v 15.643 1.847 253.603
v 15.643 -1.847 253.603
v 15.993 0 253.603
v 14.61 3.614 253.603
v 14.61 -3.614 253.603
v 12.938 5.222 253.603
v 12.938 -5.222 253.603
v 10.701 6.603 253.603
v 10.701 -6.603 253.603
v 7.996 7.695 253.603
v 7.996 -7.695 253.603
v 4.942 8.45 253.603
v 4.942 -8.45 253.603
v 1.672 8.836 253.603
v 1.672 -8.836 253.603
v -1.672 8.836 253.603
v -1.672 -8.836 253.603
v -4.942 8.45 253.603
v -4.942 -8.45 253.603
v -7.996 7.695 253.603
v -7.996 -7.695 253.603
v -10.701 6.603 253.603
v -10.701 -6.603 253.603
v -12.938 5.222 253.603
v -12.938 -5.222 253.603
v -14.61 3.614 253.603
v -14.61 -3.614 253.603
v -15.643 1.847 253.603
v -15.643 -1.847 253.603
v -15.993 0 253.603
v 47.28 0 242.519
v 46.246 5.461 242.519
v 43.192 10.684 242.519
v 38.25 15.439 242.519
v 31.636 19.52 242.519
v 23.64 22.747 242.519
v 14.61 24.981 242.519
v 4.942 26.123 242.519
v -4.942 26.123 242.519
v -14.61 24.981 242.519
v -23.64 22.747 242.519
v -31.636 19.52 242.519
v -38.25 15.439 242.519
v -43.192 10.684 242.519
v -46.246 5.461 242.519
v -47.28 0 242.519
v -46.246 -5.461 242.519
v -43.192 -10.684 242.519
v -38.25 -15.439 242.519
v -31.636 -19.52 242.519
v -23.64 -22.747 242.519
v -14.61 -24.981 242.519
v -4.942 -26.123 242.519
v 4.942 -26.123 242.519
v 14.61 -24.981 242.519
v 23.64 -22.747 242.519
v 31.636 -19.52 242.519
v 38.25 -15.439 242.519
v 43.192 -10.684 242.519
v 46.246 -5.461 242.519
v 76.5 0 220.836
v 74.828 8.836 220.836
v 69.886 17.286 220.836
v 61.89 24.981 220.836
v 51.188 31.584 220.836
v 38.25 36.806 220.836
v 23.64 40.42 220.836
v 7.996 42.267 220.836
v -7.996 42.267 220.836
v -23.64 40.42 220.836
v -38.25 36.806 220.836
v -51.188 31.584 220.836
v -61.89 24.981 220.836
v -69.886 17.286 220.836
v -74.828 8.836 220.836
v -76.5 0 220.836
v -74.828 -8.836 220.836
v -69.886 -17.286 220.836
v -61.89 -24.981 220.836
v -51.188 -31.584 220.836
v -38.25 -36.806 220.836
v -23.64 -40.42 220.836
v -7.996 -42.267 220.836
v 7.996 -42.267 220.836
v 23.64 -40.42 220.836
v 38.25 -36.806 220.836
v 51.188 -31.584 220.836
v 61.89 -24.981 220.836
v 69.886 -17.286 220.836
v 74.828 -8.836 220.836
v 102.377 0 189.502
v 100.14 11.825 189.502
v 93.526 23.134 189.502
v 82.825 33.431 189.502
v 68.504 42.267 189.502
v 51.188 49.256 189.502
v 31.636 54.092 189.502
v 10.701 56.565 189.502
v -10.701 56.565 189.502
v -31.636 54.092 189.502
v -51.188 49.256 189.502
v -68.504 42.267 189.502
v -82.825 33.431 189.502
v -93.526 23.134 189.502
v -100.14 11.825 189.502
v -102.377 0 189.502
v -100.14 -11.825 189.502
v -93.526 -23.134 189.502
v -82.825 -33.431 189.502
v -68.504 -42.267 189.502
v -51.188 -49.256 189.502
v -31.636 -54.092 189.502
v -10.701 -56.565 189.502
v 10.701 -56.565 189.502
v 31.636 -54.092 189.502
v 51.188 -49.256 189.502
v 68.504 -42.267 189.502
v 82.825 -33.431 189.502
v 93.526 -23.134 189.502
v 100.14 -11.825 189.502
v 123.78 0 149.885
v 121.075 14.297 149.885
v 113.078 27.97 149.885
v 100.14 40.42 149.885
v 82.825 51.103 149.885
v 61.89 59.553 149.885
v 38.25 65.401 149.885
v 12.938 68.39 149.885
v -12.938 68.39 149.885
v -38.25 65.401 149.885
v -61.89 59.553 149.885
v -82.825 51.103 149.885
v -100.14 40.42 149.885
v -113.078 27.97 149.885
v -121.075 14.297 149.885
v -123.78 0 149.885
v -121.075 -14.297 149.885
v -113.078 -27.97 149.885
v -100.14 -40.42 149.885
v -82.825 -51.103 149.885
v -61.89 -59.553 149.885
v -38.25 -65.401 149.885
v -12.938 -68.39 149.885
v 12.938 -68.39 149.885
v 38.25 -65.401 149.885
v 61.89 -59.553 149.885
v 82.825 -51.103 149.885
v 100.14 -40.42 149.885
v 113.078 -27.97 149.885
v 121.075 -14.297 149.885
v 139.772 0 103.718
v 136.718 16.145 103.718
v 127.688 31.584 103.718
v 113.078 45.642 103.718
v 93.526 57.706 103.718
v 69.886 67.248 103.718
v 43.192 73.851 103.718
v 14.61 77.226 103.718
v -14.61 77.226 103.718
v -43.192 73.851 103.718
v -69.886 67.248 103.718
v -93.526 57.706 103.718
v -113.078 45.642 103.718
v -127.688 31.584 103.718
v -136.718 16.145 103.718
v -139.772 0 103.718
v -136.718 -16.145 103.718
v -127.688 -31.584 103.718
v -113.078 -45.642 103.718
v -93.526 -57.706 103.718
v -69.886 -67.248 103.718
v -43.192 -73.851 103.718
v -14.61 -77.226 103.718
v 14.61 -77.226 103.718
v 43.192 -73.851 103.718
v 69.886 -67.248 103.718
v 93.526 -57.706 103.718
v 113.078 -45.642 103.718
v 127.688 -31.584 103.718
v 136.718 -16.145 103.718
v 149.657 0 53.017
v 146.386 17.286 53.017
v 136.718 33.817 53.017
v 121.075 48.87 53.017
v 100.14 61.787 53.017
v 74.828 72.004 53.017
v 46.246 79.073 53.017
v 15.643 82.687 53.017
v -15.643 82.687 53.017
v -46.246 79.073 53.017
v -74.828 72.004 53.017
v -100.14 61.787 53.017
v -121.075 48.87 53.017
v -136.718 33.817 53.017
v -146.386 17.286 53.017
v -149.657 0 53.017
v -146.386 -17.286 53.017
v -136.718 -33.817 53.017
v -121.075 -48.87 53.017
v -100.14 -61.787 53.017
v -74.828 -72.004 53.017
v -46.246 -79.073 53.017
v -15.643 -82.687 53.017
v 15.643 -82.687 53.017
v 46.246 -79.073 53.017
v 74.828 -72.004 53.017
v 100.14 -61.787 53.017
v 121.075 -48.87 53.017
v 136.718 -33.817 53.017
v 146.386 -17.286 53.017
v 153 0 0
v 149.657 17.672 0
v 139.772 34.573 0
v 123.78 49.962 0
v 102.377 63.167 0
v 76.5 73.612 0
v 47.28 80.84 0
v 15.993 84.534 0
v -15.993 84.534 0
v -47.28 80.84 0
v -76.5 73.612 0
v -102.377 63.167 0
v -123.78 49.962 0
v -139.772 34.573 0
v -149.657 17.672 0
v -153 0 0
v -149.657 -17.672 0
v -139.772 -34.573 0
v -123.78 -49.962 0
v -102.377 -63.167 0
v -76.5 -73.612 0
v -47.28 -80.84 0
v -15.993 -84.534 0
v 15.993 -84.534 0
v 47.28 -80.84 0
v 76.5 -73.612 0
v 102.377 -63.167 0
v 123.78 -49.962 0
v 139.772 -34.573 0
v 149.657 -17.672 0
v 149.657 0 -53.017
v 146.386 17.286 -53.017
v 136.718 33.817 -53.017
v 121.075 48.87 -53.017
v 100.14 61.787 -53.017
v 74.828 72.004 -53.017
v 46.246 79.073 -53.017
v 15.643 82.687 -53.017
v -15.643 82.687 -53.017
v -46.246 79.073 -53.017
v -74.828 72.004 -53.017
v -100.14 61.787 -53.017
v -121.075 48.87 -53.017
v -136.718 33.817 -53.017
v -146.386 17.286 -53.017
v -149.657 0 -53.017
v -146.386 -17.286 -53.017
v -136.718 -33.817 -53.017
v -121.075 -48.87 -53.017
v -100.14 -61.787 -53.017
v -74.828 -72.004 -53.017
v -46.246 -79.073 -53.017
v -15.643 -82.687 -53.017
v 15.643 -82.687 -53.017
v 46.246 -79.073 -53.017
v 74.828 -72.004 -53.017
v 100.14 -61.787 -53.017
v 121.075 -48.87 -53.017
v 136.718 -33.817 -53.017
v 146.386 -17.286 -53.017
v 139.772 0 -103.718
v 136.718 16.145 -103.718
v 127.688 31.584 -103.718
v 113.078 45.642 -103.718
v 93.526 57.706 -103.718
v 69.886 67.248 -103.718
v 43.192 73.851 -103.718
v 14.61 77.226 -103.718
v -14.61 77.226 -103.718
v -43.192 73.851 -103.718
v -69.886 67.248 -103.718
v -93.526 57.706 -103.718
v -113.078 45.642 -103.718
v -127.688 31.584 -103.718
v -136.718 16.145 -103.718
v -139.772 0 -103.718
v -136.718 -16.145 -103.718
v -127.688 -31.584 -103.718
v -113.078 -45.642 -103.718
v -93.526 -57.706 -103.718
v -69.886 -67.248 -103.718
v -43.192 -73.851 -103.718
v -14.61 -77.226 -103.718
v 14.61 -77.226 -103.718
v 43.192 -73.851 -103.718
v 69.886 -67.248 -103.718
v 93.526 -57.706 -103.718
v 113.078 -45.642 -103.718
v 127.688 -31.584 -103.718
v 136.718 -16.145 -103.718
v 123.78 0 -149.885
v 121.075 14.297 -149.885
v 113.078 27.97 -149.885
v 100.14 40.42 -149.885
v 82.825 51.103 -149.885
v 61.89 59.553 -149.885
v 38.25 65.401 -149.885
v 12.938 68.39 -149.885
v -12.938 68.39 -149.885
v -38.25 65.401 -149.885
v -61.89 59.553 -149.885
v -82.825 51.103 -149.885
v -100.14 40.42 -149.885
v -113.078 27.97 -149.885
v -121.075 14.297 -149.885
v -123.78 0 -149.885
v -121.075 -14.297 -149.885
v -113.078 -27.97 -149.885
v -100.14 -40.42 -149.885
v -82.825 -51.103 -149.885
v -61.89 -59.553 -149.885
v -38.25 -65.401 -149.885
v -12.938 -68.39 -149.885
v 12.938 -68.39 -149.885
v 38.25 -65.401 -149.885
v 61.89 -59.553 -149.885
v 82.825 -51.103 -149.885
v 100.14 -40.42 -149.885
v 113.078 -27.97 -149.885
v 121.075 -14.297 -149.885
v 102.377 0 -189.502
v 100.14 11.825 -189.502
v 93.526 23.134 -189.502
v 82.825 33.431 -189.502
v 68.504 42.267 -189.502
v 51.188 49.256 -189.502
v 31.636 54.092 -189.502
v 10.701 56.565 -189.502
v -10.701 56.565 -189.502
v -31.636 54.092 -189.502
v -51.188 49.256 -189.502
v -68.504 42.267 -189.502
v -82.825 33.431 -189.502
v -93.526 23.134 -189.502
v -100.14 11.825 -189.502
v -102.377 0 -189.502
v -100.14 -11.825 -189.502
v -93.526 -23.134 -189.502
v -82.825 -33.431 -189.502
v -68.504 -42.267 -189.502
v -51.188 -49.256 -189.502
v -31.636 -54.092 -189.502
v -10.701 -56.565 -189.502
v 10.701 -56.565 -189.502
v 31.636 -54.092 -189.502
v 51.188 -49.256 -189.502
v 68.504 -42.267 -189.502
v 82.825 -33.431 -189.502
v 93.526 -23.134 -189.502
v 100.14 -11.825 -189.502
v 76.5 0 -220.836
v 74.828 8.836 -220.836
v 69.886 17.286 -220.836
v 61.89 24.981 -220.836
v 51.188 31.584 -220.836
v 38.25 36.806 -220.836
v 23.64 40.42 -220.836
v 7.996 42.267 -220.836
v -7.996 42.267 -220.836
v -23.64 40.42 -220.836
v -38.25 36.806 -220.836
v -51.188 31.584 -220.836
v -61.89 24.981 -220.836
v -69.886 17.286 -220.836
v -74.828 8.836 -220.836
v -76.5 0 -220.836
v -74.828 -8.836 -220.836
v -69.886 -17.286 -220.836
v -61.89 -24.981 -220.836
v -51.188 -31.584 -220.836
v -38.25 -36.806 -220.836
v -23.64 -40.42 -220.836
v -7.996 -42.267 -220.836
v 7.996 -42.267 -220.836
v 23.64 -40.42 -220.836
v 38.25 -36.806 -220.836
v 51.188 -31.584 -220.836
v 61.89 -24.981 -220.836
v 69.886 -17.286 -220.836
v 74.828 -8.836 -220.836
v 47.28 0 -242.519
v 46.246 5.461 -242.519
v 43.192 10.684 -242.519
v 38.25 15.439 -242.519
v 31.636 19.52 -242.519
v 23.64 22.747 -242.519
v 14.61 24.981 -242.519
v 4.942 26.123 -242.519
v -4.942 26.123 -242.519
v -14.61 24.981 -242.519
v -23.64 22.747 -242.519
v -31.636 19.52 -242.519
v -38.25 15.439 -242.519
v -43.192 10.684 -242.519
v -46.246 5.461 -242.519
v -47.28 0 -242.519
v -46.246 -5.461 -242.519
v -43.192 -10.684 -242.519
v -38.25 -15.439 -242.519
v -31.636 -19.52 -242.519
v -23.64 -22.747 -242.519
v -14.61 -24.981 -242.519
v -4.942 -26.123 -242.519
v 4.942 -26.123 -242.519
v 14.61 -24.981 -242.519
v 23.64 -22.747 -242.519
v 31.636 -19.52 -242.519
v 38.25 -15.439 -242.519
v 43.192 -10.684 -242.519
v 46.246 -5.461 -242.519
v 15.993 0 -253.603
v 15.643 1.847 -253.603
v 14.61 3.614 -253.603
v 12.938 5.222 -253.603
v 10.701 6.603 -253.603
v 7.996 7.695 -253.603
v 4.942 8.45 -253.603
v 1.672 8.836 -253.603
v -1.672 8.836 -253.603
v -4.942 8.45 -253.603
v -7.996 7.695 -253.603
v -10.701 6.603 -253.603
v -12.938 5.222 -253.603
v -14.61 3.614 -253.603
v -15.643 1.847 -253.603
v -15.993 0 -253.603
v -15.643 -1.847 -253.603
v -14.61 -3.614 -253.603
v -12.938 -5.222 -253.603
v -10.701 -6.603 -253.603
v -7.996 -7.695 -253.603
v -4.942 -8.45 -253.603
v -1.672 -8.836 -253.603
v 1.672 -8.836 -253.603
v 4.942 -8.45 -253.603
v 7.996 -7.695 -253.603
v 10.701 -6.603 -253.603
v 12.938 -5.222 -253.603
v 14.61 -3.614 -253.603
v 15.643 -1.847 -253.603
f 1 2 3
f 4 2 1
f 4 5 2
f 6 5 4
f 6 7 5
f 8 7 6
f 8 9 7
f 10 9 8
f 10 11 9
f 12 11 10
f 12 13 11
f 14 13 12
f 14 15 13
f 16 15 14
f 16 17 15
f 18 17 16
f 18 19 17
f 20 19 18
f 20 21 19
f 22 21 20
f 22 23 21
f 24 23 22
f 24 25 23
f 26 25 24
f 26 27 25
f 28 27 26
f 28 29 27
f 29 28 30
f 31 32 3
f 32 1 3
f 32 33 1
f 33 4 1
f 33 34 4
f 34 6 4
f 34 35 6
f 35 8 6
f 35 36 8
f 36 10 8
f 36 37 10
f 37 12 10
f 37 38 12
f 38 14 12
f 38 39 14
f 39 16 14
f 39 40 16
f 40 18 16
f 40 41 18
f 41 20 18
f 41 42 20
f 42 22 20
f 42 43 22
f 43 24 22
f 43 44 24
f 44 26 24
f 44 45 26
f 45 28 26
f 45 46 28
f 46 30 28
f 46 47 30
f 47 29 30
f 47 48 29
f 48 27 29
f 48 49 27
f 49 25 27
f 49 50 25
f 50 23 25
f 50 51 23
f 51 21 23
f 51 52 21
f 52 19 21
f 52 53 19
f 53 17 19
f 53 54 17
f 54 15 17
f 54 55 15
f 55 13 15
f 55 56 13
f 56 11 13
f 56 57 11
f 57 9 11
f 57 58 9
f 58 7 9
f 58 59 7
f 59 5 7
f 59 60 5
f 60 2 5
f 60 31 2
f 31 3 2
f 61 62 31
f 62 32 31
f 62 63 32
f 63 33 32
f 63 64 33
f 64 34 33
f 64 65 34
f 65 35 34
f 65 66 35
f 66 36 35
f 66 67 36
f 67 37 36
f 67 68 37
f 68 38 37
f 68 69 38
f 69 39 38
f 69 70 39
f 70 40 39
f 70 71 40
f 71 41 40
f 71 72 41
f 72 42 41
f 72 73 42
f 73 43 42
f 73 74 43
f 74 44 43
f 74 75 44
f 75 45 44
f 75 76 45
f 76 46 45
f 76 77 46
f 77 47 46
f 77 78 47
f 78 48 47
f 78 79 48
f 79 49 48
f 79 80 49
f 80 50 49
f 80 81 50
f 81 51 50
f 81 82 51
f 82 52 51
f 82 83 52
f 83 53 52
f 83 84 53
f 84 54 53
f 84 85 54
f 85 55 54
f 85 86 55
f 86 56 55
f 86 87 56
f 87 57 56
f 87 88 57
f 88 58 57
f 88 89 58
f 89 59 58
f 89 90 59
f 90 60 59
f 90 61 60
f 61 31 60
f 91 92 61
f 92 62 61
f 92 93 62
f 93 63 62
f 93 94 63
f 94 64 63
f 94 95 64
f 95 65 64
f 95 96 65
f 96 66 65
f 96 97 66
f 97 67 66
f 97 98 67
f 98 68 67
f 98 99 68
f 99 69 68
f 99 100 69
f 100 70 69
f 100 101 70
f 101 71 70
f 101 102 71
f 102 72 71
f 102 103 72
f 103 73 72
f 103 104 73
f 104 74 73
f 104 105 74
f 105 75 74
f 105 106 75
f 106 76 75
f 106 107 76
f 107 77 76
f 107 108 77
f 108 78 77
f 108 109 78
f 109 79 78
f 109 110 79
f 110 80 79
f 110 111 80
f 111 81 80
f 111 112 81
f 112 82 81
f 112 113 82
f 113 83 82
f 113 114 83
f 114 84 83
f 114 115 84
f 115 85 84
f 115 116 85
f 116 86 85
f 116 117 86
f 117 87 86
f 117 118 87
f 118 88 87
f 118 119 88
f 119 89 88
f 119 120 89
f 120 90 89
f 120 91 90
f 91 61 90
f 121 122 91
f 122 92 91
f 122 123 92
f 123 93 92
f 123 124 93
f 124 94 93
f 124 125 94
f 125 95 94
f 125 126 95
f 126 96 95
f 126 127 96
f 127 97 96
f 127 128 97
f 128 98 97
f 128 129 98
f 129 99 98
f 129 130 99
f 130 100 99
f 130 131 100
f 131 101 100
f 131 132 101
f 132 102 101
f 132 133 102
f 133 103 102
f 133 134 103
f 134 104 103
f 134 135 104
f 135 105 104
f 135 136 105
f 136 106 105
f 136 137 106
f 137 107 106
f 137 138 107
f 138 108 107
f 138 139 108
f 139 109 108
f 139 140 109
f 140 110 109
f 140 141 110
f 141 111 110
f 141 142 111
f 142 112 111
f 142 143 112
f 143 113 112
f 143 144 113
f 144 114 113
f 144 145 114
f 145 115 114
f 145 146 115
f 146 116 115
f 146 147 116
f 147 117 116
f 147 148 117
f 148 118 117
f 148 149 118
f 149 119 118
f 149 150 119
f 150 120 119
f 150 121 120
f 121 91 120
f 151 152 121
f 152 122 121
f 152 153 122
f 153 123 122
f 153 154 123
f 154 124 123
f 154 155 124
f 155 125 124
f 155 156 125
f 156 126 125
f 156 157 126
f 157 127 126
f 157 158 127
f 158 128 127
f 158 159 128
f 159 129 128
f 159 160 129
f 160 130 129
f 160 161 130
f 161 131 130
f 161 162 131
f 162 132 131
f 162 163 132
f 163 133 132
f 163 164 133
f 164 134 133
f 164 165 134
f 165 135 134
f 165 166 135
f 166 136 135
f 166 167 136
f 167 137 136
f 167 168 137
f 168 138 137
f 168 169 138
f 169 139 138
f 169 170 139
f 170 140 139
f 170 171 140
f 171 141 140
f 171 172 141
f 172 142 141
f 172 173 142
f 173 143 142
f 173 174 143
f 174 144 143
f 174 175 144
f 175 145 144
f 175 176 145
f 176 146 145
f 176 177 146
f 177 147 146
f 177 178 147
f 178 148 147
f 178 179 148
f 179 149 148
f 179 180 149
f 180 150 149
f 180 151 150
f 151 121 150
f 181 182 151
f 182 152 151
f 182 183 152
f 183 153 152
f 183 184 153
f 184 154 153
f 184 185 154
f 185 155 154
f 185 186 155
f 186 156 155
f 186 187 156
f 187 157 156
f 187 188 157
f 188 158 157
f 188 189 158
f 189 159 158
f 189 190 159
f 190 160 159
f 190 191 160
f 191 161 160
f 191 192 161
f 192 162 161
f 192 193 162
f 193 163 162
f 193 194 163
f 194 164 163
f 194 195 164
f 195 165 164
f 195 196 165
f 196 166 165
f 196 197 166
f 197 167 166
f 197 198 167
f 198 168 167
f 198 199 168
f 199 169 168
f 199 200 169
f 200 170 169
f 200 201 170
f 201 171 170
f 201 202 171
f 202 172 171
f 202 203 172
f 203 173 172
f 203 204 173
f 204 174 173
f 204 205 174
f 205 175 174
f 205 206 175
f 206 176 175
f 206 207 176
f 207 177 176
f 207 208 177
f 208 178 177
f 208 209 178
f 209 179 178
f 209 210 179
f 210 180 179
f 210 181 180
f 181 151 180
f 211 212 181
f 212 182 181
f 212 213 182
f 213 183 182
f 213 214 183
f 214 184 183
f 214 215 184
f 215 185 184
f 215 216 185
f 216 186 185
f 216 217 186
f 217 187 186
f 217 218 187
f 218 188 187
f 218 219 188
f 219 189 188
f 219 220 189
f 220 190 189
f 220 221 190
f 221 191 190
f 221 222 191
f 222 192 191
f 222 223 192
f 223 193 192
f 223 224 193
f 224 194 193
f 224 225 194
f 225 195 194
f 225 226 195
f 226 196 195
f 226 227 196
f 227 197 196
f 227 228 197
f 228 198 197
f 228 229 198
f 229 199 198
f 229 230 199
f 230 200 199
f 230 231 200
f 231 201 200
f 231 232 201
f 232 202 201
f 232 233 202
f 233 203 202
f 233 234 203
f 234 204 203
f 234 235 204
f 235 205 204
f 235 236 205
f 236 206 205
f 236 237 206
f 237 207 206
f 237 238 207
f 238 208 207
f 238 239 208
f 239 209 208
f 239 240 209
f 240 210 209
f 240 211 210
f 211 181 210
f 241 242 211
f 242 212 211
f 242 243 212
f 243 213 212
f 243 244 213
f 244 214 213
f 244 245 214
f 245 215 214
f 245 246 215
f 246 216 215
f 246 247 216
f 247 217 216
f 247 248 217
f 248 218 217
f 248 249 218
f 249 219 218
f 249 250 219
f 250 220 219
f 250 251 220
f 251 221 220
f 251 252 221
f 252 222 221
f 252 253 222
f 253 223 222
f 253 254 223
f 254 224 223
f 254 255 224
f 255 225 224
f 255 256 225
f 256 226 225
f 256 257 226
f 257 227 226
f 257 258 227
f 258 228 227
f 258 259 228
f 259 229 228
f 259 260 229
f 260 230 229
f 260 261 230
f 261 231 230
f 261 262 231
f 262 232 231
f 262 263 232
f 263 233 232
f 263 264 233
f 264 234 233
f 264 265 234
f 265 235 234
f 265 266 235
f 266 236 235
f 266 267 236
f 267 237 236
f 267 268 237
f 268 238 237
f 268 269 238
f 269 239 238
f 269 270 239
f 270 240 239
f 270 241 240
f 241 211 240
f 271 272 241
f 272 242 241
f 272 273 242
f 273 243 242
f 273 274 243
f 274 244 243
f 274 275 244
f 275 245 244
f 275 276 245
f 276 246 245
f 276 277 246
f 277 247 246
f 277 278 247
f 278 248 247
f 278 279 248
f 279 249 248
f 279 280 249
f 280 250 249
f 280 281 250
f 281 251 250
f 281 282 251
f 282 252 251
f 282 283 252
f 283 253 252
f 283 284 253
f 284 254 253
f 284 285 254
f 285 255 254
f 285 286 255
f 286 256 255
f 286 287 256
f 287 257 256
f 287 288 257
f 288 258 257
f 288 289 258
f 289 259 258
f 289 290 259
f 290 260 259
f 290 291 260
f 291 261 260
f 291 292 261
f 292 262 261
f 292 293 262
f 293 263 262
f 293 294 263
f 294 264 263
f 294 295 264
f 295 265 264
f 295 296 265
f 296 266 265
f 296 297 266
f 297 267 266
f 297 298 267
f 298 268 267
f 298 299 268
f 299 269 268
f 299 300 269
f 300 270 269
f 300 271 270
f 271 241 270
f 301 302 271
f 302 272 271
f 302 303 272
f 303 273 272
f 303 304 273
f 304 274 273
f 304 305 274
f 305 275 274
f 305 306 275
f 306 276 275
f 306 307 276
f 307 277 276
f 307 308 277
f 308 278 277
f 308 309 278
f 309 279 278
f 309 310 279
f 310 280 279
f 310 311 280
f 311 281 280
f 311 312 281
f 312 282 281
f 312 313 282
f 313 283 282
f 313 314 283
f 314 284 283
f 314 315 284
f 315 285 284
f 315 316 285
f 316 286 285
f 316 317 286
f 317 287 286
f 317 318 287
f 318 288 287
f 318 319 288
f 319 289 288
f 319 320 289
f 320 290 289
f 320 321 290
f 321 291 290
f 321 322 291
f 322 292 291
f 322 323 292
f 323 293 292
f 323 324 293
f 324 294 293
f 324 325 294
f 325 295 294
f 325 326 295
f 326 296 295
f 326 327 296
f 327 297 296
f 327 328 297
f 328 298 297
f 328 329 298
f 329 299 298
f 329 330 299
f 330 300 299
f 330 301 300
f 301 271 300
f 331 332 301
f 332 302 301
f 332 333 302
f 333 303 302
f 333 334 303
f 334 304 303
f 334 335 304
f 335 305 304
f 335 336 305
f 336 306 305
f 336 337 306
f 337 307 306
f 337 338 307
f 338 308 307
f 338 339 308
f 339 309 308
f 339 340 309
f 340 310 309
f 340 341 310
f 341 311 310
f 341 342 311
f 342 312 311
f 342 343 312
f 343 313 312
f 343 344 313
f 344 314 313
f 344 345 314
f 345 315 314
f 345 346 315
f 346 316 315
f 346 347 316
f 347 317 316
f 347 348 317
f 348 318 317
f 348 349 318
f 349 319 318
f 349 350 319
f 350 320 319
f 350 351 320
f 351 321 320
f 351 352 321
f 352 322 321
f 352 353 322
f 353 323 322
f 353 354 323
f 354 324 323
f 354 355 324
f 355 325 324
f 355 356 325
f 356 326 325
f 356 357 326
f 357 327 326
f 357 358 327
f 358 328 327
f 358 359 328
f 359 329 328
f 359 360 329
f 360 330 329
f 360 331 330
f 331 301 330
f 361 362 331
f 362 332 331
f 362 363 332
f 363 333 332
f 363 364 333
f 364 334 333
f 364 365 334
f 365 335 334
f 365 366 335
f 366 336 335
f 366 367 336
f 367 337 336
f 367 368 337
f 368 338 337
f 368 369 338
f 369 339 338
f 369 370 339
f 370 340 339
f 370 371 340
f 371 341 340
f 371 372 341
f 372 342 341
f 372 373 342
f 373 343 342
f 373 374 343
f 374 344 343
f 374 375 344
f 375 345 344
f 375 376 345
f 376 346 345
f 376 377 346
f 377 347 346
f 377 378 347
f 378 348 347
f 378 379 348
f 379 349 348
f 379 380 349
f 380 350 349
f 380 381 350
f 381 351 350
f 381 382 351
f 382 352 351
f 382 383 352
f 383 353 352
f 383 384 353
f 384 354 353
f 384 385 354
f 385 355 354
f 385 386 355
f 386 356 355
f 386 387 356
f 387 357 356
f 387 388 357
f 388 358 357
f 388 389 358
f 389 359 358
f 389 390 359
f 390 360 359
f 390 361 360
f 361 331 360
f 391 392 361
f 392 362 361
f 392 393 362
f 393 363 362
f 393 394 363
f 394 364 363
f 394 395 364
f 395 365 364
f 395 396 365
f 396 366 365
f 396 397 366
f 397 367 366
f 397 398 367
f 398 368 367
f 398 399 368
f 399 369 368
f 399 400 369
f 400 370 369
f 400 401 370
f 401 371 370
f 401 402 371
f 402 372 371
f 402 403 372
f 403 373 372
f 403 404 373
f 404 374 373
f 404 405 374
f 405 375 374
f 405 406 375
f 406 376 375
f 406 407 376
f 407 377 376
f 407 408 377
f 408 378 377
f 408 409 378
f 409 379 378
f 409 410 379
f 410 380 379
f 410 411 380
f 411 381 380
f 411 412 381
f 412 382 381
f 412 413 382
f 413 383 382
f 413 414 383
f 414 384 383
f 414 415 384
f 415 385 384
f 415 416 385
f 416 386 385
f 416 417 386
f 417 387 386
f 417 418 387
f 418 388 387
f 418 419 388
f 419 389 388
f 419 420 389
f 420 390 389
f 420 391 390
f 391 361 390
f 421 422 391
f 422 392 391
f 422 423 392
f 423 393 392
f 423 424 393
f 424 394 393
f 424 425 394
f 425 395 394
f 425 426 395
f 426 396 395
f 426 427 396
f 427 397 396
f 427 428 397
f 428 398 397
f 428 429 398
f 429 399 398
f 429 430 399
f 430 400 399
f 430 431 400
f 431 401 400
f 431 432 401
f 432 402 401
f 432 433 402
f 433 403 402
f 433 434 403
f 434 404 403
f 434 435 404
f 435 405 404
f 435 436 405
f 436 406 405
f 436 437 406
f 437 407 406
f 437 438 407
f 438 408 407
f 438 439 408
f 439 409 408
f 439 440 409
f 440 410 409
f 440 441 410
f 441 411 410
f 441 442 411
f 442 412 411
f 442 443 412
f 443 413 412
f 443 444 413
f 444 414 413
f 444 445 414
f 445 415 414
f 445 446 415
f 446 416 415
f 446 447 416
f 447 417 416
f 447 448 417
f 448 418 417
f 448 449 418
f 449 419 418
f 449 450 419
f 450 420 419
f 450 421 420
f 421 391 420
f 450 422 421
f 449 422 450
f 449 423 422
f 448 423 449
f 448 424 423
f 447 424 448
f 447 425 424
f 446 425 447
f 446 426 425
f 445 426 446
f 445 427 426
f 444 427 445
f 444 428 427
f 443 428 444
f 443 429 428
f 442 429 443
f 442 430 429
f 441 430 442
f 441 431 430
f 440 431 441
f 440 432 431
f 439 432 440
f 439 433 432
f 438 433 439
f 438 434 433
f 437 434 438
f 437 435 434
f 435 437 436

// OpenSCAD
// Generated by SolidPython 1.0.1 on 2020-07-29 00:46:48


scale(v = [9, 5, 15]) {
	sphere(r = 17);
}
/***********************************************
*********      SolidPython code:      **********
************************************************
 
# import packages: SolidPython
from solid import *
from solid.utils import *
from itertools import chain, combinations, permutations


class Resize:

    def __init__(self, scad_file):
        self.scad_file = scad_file
        #self.scad_file = import_scad(scad_file)
        # cone/cylinder param:
        self.r1 = 0
        self.r2 = 0
        self.h = 0
        # rectangular prism param:
        self.w = 0
        self.l = 0
        # ellipse param:
        self.r = 0

    # import OpenScad code (file name corresponds to shape)


    # classify shape + parameters
    def assign(self, param1, param2, param3):
        if self.scad_file == 'cone.scad':
            self.r1 = param1
            self.r2 = param2
            self.h = param3
        elif self.scad_file == 'cylinder.scad':
            self.r1 = param1
            self.r2 = param2
            self.h = param3
        elif self.scad_file == 'rectangularPrism.scad':
            self.h = param1
            self.l = param2
            self.w = param3
        else:
            self.r = param1
            self.h = param2

    # resize parameters
    def iterate(self):
        x = range(3, 20, 2)
        i = 1
        if self.scad_file == 'cone.scad':
            tempList = list(permutations(x, 2))
            for temp in tempList:
                param1 = temp[0]
                param2 = temp[1]
                filepath = 'produced_scad_files/' + 'cone' + str(param1) + '_' + str(param2) + '_' + '.scad'
                scad_render_to_file(cylinder(h=param1, r1=param2, r2=0), filepath)

        elif self.scad_file == 'cylinder.scad':
            tempList = list(permutations(x, 3))
            for temp in tempList:
                param1 = temp[0]
                param2 = temp[1]
                filepath = 'produced_scad_files/' + 'cylinder' + str(param1) + '_' + str(param2) + '_' + '.scad'
                scad_render_to_file(cylinder(h=param1, r1=param2, r2=param2), filepath)

        elif self.scad_file == 'rectangularPrism.scad':
            tempList = list(permutations(x, 3))
            for temp in tempList:
                param1 = temp[0]
                param2 = temp[1]
                param3 = temp[2]
                filepath = 'produced_scad_files/' + 'rectangularPrism' + str(param1) + '_' + str(param2) + '_' + str(
                    param3) + '.scad'
                scad_render_to_file(cube(size=(param1, param2, param3)), filepath)

        elif self.scad_file == 'ellipse.scad':
            tempList = list(permutations(x, 4))
            for temp in tempList:
                param1 = temp[0]
                param2 = temp[1]
                param3 = temp[2]
                param4 = temp[3]
                filepath = 'produced_scad_files/' + 'ellipse' + str(param1) + '_' + str(param2) + '_' + str(param3) + '_' + str(param4) + '.scad'
                scad_render_to_file(scale([param1, param2, param3])(sphere(r=param4)), filepath)

    def render_to_scadfile(self):
        scad_render_to_file(scad, 'example.scad') 
 
************************************************/
